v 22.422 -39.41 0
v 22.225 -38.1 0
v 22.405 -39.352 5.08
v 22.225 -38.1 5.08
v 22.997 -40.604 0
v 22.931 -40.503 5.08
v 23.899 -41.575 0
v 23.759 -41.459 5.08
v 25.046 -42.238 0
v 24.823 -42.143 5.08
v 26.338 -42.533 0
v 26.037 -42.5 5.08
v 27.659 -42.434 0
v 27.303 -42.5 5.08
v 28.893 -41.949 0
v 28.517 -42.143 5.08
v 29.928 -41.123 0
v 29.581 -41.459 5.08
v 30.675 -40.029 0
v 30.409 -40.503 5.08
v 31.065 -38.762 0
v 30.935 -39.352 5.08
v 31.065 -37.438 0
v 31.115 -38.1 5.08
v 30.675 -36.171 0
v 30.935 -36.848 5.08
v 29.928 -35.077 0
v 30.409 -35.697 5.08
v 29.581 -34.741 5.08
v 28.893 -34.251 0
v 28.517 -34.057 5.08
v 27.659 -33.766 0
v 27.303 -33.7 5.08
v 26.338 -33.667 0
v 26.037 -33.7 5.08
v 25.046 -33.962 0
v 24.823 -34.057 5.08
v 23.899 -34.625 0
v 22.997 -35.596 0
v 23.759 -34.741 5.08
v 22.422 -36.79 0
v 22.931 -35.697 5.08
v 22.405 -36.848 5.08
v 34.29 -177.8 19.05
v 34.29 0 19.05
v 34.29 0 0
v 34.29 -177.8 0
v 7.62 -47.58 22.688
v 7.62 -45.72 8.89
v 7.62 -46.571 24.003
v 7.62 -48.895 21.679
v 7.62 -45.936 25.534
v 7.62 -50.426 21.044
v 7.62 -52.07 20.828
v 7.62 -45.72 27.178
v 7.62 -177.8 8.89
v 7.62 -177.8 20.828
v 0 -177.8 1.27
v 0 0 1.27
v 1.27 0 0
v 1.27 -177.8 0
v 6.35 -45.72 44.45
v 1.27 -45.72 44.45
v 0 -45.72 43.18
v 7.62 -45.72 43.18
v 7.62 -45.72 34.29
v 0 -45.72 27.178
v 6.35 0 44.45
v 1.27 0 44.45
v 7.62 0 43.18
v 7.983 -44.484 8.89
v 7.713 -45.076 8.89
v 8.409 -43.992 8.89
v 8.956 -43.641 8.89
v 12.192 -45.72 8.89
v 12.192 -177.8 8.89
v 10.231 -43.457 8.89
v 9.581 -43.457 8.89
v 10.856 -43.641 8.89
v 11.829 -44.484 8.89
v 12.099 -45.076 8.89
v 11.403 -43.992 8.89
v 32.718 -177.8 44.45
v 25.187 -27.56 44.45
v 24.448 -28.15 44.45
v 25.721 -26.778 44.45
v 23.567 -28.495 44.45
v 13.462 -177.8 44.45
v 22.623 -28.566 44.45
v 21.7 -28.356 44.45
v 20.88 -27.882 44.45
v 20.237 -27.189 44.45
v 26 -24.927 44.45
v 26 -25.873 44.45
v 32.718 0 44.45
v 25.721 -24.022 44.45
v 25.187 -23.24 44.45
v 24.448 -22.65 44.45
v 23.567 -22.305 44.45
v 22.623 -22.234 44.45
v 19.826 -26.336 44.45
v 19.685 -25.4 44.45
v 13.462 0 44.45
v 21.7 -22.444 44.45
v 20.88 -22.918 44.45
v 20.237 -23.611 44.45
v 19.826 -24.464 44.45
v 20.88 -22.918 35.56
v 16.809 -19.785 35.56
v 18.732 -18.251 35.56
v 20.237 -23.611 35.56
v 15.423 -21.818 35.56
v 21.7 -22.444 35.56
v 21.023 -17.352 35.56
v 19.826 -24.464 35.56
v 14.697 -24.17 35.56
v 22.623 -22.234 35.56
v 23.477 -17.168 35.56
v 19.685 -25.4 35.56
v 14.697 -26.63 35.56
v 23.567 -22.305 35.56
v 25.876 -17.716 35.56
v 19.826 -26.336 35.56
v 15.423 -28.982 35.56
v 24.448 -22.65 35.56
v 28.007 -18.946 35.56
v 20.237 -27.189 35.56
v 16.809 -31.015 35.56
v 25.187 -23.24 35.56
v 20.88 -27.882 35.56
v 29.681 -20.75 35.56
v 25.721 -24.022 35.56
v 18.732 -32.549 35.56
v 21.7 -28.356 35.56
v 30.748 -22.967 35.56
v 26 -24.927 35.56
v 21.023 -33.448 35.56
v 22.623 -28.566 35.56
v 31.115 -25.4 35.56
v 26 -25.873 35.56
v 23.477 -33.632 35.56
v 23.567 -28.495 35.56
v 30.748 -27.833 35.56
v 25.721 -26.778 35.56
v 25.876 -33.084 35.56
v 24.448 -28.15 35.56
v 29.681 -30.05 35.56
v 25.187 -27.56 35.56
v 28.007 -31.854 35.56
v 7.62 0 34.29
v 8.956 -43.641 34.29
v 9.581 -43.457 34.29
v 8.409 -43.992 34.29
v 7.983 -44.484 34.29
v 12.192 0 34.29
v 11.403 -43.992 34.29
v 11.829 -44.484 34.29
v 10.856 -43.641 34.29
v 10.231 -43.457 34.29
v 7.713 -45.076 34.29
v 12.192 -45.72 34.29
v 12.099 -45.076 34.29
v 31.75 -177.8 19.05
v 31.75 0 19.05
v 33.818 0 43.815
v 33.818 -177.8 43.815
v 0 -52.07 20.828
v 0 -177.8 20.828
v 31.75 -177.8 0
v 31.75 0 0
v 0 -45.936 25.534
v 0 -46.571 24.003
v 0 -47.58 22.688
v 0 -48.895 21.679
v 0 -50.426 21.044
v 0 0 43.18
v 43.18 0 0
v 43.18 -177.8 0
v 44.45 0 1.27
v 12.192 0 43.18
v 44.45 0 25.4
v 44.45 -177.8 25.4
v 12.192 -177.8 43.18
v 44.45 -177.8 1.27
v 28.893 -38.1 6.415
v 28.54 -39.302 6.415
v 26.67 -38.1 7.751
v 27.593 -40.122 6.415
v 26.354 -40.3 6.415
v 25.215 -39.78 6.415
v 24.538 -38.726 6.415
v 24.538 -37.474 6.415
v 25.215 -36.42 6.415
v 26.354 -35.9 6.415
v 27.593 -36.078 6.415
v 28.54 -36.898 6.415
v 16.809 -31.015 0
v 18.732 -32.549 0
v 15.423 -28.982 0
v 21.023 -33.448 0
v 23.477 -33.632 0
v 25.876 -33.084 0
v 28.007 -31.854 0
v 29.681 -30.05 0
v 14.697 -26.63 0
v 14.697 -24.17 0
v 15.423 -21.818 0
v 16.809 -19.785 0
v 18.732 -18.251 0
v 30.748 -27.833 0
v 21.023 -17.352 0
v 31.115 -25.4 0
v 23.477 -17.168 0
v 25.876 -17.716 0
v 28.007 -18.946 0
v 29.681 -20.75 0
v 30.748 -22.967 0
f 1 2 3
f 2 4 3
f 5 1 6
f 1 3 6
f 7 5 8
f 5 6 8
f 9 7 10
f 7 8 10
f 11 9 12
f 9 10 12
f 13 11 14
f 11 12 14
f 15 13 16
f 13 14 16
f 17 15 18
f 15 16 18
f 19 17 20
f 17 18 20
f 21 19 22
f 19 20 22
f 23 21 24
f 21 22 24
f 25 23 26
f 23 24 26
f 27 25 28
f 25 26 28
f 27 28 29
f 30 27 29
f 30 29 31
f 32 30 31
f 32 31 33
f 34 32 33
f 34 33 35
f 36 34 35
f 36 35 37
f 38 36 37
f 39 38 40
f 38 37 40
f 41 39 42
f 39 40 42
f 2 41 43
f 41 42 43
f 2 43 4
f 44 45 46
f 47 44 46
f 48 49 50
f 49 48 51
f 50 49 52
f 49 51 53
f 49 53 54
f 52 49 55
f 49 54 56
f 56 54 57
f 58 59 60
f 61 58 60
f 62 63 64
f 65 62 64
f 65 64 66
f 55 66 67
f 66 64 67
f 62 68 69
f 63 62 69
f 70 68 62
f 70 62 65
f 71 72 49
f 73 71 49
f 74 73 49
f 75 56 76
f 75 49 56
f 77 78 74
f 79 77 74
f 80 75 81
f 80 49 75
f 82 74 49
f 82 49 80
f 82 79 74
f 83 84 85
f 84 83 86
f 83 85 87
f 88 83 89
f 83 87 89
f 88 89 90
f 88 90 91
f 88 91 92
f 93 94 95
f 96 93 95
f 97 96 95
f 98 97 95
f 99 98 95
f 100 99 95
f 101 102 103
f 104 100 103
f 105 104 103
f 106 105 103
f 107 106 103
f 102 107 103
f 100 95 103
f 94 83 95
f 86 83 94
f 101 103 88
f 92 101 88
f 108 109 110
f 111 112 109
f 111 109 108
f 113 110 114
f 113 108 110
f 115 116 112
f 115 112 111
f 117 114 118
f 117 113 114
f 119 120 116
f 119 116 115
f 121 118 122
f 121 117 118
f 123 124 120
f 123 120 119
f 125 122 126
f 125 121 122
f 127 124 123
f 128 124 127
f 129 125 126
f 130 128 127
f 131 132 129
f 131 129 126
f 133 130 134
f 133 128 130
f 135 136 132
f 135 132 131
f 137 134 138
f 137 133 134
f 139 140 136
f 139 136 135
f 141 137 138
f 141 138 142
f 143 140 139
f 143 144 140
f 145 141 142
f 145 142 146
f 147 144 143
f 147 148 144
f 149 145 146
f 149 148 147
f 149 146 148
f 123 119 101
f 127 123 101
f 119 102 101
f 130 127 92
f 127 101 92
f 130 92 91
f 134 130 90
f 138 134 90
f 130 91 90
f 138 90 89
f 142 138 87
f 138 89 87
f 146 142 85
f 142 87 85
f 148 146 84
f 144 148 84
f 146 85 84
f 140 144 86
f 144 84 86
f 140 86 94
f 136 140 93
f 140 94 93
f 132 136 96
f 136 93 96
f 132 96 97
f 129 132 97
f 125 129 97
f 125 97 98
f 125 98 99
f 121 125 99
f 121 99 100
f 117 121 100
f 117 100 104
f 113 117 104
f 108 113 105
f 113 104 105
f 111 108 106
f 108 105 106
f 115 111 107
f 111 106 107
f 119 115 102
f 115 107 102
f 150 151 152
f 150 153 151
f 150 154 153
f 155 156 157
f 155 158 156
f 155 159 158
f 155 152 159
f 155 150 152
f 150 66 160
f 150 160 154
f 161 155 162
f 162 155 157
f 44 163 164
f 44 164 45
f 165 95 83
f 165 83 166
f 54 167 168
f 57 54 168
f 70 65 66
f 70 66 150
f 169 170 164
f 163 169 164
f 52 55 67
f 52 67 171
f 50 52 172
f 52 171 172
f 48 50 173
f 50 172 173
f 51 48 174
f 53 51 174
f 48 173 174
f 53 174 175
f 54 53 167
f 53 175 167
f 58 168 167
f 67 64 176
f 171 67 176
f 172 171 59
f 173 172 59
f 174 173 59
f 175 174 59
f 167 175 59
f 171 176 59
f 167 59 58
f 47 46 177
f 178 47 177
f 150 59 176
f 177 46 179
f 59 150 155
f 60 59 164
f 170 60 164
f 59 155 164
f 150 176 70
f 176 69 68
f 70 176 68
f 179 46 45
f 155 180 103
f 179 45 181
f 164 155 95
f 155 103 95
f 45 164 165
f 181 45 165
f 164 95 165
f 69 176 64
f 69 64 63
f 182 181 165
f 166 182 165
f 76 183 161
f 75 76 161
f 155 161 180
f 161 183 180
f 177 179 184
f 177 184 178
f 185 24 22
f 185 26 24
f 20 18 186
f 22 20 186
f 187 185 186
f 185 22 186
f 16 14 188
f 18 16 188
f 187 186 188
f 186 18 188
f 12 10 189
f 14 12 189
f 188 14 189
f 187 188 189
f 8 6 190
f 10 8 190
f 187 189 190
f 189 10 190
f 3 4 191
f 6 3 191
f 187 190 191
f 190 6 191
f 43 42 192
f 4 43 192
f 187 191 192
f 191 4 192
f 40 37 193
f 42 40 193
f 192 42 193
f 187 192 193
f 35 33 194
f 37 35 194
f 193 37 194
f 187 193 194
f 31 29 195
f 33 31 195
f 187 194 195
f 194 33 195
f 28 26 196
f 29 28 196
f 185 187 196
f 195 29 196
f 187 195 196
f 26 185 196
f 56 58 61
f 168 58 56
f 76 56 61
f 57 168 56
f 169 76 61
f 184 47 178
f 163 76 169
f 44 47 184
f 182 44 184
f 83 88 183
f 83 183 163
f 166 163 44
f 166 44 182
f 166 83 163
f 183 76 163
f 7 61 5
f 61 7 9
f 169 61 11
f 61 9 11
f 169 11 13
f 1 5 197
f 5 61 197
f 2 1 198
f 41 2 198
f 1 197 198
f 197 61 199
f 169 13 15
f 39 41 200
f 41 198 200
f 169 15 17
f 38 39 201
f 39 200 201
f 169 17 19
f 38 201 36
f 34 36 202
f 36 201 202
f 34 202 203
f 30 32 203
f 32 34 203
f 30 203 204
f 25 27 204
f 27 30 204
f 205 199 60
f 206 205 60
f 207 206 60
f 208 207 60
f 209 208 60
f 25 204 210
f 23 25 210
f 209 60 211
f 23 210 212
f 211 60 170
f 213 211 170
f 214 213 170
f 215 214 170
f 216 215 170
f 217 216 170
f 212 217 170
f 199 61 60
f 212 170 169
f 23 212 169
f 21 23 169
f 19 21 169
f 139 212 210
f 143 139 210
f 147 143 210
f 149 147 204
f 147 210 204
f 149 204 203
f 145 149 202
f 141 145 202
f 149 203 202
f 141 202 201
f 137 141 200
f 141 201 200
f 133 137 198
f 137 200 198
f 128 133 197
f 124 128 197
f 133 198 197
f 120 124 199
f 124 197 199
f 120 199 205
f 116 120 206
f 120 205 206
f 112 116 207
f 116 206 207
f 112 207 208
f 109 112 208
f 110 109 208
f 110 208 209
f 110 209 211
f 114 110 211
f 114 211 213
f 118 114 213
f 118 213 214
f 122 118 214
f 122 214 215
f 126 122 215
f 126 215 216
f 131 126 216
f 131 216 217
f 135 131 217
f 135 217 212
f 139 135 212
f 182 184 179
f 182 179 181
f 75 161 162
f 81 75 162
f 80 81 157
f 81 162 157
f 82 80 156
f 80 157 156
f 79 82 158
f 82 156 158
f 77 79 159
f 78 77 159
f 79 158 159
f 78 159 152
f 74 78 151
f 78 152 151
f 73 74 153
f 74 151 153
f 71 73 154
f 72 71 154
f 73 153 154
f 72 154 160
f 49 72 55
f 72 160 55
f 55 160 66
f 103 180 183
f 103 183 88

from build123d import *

# Parameters (mm, degrees)
F1_DEPTH        = 177.8
F3_DEPTH        = 9.906
F4_W            = 4.572
F4_H            = 177.8
F5_DEPTH        = 10.16
F7_DEPTH        = 35.56
F9_D            = 8.89
F9_DEPTH        = 5.08
F9_TIP          = 2.6708254516
F10_D           = 6.35
F10_CBORE_D     = 16.51
F10_CBORE_DEPTH = 35.56
F11_T1_DEPTH    = 184.3320747894
F11_T3_DEPTH    = 52.2520747894
F11_T5_DEPTH    = 181.6882193011


# Not quite as in the source:
# - a fillet or chamfer that OpenCascade refuses, or shapes differently, is made with other operations: its cross-section is extruded or revolved along the edge and cut away or added


with BuildPart() as f1:
    # F0 (on Front) → F1 (new body)
    with BuildSketch(Plane.XZ):
        Polygon((0, 44.45), (0, 0), (31.75, 0), (31.75, 19.05), (34.29, 19.05), (34.29, 0), (44.45, 0), (44.45, 25.4), (33.4514773719, 44.45), align=None)
    extrude(amount=F1_DEPTH)

    # F2 (on face) → F3 (cut)
    with BuildSketch(Plane(origin=(0, 0, 0), x_dir=(0, -1, 0), z_dir=(-1, 0, 0))):
        with BuildLine():
            Line((177.8, 20.828), (177.8, 44.45))
            Line((177.8, 44.45), (45.72, 44.45))
            Line((45.72, 44.45), (45.72, 27.178))
            ThreePointArc((45.72, 27.178), (47.5798719395, 22.6878719395), (52.07, 20.828))
            Line((52.07, 20.828), (177.8, 20.828))
        make_face()
    extrude(amount=-F3_DEPTH, mode=Mode.SUBTRACT)

    # F4 (on face) → F5 (cut)
    with BuildSketch(Plane.XY.offset(44.45)):
        with Locations((9.906, -88.9)):
            Rectangle(F4_W, F4_H)
    extrude(amount=-F5_DEPTH, mode=Mode.SUBTRACT)

    # F6 (on face) → F7 (cut)
    with BuildSketch(Plane.XY.offset(44.45)):
        with BuildLine():
            Line((7.62, -177.8), (12.192, -177.8))
            Line((12.192, -177.8), (12.192, -45.72))
            ThreePointArc((12.192, -45.72), (9.906, -43.434), (7.62, -45.72))
            Line((7.62, -45.72), (7.62, -177.8))
        make_face()
    extrude(amount=-F7_DEPTH, mode=Mode.SUBTRACT)

    # F9
    with Locations(Plane(origin=(0, 0, 0), x_dir=(1, 0, 0), z_dir=(0, 0, -1))):
        with Locations((26.67, 38.1)):
            Hole(F9_D / 2, depth=F9_DEPTH)
            with Locations((0, 0, -(F9_DEPTH + F9_TIP / 2))):  # 118° drill point
                Cone(0, F9_D / 2, F9_TIP, mode=Mode.SUBTRACT)

    # F10 (through all)
    with Locations(Plane(origin=(0, 0, 0), x_dir=(1, 0, 0), z_dir=(0, 0, -1))):
        with Locations((22.86, 25.4)):
            CounterBoreHole(F10_D / 2, F10_CBORE_D / 2, F10_CBORE_DEPTH)

    # F11: chamfer of 1.27 on 6 edges, made by hand

    # F11_s2 → F11_t1 (cut)
    with BuildSketch(Plane.XZ.offset(-3.2660373947)):
        Polygon((12.192, 43.18), (13.462, 44.45), (12.192, 44.45), align=None)
        Polygon((0, 1.27), (1.27, 0), (0, 0), align=None)
        Polygon((44.45, 1.27), (43.18, 0), (44.45, 0), align=None)
    extrude(amount=F11_T1_DEPTH, mode=Mode.SUBTRACT)

    # F11_s4 → F11_t3 (cut)
    with BuildSketch(Plane.XZ.offset(-3.2660373947)):
        Polygon((6.35, 44.45), (7.62, 43.18), (7.62, 44.45), align=None)
        Polygon((0, 43.18), (1.27, 44.45), (0, 44.45), align=None)
    extrude(amount=F11_T3_DEPTH, mode=Mode.SUBTRACT)

    # F11_s6 → F11_t5 (cut)
    with BuildSketch(Plane.XZ.offset(-1.9441096505)):
        Polygon((32.7182425301, 44.45), (33.8180947929, 43.815), (33.4514773719, 44.45), align=None)
    extrude(amount=F11_T5_DEPTH, mode=Mode.SUBTRACT)


solid = f1.part
